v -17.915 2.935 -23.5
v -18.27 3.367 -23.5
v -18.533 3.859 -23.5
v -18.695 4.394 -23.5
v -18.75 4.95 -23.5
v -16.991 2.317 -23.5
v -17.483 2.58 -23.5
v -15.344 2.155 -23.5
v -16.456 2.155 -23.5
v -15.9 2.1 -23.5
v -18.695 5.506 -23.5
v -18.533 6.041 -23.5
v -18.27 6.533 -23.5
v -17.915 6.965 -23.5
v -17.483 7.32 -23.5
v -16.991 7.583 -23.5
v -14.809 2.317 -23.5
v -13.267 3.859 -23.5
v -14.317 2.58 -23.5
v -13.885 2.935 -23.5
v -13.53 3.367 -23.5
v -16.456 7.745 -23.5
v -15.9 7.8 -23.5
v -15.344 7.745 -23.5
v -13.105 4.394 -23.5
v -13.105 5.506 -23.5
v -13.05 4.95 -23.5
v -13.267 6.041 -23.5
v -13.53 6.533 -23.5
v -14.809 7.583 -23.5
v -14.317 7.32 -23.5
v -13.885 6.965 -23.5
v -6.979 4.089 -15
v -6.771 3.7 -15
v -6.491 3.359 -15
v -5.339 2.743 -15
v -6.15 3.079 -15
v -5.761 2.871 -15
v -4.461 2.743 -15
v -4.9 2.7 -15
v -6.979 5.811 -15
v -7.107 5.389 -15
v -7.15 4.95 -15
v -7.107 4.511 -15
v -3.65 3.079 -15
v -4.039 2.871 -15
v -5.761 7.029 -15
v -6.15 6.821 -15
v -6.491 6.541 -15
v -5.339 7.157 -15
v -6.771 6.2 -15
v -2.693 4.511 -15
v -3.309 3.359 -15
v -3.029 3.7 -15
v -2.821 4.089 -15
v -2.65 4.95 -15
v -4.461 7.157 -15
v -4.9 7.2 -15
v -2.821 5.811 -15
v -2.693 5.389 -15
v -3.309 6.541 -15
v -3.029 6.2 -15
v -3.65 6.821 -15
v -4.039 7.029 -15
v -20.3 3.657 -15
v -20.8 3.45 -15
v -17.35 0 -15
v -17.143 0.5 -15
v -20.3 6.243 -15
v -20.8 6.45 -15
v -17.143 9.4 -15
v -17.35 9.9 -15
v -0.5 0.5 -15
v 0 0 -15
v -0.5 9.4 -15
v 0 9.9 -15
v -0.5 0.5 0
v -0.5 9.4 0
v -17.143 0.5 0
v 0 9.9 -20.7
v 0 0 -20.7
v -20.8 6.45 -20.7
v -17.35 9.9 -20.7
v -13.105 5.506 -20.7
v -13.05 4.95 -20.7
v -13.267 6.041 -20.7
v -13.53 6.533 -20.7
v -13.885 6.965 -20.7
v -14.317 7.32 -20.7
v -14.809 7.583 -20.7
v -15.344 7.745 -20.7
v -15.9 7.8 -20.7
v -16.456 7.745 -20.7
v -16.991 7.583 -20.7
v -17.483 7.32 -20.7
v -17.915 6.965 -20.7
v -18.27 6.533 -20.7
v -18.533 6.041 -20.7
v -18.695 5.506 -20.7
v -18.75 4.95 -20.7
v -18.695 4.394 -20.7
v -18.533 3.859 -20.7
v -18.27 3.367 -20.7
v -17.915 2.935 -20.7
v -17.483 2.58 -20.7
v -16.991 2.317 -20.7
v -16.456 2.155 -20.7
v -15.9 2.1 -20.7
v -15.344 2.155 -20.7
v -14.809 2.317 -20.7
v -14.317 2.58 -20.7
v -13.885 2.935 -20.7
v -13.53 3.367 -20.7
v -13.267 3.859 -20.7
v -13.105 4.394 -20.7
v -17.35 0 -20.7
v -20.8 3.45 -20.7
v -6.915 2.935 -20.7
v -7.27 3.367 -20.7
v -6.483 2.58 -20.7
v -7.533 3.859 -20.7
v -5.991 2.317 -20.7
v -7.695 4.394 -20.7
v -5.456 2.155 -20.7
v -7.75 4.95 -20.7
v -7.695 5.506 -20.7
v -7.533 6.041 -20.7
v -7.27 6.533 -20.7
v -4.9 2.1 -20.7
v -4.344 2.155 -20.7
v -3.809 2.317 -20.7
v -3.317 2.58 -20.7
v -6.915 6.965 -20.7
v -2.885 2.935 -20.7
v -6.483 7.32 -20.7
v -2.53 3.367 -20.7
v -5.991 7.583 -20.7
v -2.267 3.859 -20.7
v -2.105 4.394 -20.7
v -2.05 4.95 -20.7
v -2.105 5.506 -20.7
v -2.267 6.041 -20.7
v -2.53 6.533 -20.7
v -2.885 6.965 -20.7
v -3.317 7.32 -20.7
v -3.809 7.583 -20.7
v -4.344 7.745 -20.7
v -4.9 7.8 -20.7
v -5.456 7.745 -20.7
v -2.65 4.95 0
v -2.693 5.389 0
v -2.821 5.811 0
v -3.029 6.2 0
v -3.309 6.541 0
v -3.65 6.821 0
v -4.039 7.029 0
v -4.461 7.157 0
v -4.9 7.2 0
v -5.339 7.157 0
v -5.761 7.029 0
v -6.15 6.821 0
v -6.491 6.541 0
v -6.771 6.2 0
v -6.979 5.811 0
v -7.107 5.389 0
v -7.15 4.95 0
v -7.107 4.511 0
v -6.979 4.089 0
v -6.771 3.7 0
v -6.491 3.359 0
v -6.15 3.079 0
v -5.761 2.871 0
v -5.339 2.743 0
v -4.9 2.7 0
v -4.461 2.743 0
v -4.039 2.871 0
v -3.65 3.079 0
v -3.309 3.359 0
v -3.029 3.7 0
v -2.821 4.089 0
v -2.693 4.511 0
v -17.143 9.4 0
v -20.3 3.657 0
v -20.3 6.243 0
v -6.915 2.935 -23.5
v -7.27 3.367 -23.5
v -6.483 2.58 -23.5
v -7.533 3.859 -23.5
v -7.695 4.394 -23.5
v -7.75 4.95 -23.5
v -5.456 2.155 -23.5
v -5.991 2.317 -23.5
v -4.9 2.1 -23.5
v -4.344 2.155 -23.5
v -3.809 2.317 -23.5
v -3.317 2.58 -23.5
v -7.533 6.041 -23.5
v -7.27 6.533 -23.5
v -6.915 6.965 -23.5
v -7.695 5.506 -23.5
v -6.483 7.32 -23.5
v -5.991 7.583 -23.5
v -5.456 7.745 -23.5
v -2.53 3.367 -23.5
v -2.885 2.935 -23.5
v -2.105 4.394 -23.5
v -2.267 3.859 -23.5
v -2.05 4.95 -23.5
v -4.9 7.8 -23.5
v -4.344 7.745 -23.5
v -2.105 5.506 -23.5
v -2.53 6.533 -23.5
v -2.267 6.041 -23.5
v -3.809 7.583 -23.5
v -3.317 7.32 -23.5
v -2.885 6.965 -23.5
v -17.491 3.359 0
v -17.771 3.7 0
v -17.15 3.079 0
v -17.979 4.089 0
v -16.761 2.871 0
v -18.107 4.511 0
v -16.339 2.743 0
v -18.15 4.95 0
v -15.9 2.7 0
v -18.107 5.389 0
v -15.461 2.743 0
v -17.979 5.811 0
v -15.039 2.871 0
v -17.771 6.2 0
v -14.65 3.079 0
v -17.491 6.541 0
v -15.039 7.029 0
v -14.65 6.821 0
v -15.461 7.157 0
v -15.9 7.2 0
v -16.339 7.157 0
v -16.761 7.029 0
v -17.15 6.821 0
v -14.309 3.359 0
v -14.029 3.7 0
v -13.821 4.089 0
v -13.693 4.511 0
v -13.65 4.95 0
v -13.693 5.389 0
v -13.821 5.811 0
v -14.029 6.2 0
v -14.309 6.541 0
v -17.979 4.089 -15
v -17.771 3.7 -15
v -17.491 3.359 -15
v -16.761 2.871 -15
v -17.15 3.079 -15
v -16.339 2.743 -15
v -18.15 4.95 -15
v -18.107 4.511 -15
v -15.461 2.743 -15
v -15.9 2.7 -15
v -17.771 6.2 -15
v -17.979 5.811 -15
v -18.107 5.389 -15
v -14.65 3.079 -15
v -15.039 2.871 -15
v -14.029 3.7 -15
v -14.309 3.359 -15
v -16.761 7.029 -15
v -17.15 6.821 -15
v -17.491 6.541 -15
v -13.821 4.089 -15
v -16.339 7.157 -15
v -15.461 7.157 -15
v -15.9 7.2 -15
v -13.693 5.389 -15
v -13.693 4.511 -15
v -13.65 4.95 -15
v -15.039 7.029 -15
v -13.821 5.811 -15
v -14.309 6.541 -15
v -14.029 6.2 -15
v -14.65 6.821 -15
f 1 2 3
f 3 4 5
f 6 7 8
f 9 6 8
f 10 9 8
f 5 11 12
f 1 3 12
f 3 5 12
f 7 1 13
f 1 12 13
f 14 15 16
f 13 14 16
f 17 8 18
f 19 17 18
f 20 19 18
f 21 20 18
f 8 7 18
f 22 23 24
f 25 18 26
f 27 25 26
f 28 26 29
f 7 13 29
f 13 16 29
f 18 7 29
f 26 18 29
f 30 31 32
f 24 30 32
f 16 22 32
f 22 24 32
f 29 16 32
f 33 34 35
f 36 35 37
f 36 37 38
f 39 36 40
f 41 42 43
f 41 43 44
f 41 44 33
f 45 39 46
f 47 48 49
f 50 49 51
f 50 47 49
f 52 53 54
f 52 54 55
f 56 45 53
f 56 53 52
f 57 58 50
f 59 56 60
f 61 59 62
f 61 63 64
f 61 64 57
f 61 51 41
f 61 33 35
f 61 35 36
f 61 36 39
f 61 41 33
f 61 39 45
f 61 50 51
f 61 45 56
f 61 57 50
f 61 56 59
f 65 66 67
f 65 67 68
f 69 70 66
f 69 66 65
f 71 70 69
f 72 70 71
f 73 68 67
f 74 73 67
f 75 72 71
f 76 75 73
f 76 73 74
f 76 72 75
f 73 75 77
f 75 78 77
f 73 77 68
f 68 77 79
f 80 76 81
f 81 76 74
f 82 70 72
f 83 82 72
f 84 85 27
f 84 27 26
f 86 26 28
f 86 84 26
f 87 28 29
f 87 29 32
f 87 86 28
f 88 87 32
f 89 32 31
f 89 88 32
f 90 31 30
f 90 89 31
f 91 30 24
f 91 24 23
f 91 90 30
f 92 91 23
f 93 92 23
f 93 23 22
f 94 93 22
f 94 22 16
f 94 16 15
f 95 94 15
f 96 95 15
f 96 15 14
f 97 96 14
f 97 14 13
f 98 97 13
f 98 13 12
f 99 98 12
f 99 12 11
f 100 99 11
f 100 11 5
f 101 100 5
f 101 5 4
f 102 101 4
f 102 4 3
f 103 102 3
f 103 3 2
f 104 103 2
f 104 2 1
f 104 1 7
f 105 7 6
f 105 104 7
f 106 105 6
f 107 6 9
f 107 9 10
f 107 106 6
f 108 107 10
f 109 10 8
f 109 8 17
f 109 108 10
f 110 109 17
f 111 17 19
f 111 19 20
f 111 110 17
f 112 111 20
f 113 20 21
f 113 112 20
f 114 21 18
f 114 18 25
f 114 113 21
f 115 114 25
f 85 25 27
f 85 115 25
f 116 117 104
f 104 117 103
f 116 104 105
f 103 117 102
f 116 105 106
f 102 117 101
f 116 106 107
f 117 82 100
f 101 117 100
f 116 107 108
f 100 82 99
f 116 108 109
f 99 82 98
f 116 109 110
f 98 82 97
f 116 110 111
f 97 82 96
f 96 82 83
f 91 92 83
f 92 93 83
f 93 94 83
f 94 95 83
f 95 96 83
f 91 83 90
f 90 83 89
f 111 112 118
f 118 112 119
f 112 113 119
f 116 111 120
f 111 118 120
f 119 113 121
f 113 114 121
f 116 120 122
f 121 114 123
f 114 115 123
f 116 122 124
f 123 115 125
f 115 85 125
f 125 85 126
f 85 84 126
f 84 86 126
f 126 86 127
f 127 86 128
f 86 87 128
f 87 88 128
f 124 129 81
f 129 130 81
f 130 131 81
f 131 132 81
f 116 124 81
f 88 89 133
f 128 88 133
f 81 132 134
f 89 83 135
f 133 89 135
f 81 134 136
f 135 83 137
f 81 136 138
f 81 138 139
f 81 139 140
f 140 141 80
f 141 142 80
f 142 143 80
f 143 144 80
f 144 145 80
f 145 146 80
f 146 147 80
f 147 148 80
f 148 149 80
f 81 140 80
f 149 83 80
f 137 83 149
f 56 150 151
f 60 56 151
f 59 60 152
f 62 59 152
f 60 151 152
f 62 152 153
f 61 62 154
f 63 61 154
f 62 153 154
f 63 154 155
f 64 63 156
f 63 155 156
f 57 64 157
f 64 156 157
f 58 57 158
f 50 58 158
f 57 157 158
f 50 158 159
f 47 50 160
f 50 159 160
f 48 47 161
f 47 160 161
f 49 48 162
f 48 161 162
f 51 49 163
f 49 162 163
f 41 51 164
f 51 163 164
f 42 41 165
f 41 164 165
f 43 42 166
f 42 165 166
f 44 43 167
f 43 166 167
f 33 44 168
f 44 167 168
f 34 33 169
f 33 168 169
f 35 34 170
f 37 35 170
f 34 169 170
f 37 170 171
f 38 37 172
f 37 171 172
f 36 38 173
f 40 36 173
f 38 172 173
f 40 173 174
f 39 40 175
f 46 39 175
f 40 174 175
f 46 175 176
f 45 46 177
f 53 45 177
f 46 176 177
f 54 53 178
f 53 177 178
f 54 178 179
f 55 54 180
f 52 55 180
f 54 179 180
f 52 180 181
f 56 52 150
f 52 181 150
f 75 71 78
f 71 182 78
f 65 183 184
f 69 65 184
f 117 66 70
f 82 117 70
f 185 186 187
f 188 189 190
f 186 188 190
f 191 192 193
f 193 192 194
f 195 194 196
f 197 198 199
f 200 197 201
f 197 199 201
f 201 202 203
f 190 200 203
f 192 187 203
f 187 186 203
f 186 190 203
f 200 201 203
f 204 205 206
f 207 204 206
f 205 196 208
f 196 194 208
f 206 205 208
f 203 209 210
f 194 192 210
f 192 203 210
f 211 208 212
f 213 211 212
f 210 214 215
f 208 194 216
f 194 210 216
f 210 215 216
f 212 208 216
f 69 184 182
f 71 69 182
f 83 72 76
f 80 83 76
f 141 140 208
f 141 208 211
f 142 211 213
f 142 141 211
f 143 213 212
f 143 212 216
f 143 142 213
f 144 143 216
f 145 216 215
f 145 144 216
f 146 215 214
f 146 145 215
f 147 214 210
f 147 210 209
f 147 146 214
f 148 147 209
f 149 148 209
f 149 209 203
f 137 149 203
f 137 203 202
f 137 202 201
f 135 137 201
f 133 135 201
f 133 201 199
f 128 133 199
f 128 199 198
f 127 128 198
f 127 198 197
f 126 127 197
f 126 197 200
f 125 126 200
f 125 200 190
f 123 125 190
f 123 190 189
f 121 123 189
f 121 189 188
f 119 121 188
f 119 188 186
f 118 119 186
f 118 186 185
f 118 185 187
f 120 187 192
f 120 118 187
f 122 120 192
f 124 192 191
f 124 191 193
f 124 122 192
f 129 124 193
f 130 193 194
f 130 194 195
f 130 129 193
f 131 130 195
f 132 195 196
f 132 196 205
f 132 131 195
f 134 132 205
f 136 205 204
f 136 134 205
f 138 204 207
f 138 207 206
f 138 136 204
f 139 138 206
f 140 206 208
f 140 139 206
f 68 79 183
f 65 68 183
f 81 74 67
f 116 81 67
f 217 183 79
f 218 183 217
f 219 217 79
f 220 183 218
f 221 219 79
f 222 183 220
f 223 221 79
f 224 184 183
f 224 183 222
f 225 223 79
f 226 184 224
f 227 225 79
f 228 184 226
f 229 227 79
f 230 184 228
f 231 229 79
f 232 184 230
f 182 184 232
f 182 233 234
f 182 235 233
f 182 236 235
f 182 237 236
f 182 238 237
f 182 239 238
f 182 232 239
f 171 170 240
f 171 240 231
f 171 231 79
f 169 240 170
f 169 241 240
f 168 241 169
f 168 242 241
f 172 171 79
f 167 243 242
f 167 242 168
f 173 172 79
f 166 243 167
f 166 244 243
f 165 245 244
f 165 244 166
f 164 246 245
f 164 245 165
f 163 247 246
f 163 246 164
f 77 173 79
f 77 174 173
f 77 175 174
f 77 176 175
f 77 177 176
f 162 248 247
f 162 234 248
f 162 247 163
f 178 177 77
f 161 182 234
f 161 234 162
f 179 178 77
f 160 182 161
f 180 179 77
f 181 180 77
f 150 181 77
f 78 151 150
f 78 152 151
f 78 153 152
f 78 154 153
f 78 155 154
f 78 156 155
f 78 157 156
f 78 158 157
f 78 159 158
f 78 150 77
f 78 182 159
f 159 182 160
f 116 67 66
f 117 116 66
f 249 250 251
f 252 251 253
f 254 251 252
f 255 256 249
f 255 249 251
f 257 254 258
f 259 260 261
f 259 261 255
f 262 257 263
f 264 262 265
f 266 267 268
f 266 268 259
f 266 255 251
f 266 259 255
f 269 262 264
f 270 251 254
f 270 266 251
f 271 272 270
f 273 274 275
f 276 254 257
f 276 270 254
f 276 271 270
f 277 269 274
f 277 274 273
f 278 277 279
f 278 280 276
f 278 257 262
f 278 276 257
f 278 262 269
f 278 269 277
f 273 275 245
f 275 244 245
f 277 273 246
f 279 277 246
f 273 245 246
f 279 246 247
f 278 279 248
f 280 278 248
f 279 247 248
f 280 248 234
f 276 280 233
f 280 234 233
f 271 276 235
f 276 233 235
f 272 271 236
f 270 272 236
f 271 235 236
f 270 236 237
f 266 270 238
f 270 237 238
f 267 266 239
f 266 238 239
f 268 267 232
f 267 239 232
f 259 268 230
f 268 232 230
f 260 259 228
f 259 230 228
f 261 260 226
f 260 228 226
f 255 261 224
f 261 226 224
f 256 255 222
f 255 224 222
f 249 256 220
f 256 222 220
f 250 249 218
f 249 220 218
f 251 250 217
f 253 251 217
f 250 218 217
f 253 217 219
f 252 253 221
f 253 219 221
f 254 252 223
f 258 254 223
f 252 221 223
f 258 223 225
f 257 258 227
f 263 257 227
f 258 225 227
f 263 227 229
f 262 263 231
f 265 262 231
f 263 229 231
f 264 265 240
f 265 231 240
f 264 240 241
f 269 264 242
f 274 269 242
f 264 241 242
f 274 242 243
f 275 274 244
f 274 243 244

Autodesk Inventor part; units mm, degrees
ref_plane "YZ Plane" through (0, 0, 0) normal (1, 0, 0) x (0, 1, 0)
ref_plane "XZ Plane" through (0, 0, 0) normal (0, 1, 0) x (-1, 0, 0)
ref_plane "XY Plane" through (0, 0, 0) normal (0, 0, 1) x (1, 0, 0)
sketch "Skizze1" plane through (0, 0, 0) normal (0, 0, 1) x (1, 0, 0)
  line L0 (0, 9.9) -> (0, 0)
  line L1 (0, 0) -> (-17.35, 0)
  line L2 (-17.35, 0) -> (-20.8, 3.45)
  line L3 (-20.8, 3.45) -> (-20.8, 6.45)
  line L4 (-20.8, 6.45) -> (-17.35, 9.9)
  line L5 (-17.35, 9.9) -> (0, 9.9)
  circle A0 centre (-15.9, 4.95) radius 2.85
  circle A1 centre (-4.9, 4.95) radius 2.85
  line L6 (-0.5, 9.4) -> (-0.5, 0.5)
  line L7 (-0.5, 0.5) -> (-17.1429, 0.5)
  line L8 (-17.1429, 0.5) -> (-20.3, 3.6571)
  line L9 (-20.3, 3.6571) -> (-20.3, 6.2429)
  line L10 (-20.3, 6.2429) -> (-17.1429, 9.4)
  line L11 (-17.1429, 9.4) -> (-0.5, 9.4)
  circle A2 centre (-15.9, 4.95) radius 2.25
  circle A3 centre (-4.9, 4.95) radius 2.25
  point P0 (0, 4.95)
  dimension "d2" = 20.8
  dimension "d4" = 45
  dimension "d5" = 9.9
  dimension "d6" = 3
  dimension "d8" = 5.7
  dimension "d9" = 11
  dimension "d11" = 4.9
  dimension "d12" = 0.5
  dimension "d13" = 4.5
extrude "Extrusion1" add sketch "Skizze1" against normal blind 20.7 contours L0 L1 L2 L3 L4 L5 | A0 | A1 | L6 L7 L8 L9 L10 L11 | A2 | A3
extrude "Extrusion2" add sketch "Skizze1" against normal blind 23.5 contours A0 | A1 | A2 | A3
extrude "Extrusion3" cut sketch "Skizze1" against normal blind 15 contours L0 L1 L2 L3 L4 L5 | A2 | A3
equation "\"d11\" = -0.5 * d9 + 0.5 * d2"
properties part number "XT90NE-M" material "PC/ABS-Kunststoff"
